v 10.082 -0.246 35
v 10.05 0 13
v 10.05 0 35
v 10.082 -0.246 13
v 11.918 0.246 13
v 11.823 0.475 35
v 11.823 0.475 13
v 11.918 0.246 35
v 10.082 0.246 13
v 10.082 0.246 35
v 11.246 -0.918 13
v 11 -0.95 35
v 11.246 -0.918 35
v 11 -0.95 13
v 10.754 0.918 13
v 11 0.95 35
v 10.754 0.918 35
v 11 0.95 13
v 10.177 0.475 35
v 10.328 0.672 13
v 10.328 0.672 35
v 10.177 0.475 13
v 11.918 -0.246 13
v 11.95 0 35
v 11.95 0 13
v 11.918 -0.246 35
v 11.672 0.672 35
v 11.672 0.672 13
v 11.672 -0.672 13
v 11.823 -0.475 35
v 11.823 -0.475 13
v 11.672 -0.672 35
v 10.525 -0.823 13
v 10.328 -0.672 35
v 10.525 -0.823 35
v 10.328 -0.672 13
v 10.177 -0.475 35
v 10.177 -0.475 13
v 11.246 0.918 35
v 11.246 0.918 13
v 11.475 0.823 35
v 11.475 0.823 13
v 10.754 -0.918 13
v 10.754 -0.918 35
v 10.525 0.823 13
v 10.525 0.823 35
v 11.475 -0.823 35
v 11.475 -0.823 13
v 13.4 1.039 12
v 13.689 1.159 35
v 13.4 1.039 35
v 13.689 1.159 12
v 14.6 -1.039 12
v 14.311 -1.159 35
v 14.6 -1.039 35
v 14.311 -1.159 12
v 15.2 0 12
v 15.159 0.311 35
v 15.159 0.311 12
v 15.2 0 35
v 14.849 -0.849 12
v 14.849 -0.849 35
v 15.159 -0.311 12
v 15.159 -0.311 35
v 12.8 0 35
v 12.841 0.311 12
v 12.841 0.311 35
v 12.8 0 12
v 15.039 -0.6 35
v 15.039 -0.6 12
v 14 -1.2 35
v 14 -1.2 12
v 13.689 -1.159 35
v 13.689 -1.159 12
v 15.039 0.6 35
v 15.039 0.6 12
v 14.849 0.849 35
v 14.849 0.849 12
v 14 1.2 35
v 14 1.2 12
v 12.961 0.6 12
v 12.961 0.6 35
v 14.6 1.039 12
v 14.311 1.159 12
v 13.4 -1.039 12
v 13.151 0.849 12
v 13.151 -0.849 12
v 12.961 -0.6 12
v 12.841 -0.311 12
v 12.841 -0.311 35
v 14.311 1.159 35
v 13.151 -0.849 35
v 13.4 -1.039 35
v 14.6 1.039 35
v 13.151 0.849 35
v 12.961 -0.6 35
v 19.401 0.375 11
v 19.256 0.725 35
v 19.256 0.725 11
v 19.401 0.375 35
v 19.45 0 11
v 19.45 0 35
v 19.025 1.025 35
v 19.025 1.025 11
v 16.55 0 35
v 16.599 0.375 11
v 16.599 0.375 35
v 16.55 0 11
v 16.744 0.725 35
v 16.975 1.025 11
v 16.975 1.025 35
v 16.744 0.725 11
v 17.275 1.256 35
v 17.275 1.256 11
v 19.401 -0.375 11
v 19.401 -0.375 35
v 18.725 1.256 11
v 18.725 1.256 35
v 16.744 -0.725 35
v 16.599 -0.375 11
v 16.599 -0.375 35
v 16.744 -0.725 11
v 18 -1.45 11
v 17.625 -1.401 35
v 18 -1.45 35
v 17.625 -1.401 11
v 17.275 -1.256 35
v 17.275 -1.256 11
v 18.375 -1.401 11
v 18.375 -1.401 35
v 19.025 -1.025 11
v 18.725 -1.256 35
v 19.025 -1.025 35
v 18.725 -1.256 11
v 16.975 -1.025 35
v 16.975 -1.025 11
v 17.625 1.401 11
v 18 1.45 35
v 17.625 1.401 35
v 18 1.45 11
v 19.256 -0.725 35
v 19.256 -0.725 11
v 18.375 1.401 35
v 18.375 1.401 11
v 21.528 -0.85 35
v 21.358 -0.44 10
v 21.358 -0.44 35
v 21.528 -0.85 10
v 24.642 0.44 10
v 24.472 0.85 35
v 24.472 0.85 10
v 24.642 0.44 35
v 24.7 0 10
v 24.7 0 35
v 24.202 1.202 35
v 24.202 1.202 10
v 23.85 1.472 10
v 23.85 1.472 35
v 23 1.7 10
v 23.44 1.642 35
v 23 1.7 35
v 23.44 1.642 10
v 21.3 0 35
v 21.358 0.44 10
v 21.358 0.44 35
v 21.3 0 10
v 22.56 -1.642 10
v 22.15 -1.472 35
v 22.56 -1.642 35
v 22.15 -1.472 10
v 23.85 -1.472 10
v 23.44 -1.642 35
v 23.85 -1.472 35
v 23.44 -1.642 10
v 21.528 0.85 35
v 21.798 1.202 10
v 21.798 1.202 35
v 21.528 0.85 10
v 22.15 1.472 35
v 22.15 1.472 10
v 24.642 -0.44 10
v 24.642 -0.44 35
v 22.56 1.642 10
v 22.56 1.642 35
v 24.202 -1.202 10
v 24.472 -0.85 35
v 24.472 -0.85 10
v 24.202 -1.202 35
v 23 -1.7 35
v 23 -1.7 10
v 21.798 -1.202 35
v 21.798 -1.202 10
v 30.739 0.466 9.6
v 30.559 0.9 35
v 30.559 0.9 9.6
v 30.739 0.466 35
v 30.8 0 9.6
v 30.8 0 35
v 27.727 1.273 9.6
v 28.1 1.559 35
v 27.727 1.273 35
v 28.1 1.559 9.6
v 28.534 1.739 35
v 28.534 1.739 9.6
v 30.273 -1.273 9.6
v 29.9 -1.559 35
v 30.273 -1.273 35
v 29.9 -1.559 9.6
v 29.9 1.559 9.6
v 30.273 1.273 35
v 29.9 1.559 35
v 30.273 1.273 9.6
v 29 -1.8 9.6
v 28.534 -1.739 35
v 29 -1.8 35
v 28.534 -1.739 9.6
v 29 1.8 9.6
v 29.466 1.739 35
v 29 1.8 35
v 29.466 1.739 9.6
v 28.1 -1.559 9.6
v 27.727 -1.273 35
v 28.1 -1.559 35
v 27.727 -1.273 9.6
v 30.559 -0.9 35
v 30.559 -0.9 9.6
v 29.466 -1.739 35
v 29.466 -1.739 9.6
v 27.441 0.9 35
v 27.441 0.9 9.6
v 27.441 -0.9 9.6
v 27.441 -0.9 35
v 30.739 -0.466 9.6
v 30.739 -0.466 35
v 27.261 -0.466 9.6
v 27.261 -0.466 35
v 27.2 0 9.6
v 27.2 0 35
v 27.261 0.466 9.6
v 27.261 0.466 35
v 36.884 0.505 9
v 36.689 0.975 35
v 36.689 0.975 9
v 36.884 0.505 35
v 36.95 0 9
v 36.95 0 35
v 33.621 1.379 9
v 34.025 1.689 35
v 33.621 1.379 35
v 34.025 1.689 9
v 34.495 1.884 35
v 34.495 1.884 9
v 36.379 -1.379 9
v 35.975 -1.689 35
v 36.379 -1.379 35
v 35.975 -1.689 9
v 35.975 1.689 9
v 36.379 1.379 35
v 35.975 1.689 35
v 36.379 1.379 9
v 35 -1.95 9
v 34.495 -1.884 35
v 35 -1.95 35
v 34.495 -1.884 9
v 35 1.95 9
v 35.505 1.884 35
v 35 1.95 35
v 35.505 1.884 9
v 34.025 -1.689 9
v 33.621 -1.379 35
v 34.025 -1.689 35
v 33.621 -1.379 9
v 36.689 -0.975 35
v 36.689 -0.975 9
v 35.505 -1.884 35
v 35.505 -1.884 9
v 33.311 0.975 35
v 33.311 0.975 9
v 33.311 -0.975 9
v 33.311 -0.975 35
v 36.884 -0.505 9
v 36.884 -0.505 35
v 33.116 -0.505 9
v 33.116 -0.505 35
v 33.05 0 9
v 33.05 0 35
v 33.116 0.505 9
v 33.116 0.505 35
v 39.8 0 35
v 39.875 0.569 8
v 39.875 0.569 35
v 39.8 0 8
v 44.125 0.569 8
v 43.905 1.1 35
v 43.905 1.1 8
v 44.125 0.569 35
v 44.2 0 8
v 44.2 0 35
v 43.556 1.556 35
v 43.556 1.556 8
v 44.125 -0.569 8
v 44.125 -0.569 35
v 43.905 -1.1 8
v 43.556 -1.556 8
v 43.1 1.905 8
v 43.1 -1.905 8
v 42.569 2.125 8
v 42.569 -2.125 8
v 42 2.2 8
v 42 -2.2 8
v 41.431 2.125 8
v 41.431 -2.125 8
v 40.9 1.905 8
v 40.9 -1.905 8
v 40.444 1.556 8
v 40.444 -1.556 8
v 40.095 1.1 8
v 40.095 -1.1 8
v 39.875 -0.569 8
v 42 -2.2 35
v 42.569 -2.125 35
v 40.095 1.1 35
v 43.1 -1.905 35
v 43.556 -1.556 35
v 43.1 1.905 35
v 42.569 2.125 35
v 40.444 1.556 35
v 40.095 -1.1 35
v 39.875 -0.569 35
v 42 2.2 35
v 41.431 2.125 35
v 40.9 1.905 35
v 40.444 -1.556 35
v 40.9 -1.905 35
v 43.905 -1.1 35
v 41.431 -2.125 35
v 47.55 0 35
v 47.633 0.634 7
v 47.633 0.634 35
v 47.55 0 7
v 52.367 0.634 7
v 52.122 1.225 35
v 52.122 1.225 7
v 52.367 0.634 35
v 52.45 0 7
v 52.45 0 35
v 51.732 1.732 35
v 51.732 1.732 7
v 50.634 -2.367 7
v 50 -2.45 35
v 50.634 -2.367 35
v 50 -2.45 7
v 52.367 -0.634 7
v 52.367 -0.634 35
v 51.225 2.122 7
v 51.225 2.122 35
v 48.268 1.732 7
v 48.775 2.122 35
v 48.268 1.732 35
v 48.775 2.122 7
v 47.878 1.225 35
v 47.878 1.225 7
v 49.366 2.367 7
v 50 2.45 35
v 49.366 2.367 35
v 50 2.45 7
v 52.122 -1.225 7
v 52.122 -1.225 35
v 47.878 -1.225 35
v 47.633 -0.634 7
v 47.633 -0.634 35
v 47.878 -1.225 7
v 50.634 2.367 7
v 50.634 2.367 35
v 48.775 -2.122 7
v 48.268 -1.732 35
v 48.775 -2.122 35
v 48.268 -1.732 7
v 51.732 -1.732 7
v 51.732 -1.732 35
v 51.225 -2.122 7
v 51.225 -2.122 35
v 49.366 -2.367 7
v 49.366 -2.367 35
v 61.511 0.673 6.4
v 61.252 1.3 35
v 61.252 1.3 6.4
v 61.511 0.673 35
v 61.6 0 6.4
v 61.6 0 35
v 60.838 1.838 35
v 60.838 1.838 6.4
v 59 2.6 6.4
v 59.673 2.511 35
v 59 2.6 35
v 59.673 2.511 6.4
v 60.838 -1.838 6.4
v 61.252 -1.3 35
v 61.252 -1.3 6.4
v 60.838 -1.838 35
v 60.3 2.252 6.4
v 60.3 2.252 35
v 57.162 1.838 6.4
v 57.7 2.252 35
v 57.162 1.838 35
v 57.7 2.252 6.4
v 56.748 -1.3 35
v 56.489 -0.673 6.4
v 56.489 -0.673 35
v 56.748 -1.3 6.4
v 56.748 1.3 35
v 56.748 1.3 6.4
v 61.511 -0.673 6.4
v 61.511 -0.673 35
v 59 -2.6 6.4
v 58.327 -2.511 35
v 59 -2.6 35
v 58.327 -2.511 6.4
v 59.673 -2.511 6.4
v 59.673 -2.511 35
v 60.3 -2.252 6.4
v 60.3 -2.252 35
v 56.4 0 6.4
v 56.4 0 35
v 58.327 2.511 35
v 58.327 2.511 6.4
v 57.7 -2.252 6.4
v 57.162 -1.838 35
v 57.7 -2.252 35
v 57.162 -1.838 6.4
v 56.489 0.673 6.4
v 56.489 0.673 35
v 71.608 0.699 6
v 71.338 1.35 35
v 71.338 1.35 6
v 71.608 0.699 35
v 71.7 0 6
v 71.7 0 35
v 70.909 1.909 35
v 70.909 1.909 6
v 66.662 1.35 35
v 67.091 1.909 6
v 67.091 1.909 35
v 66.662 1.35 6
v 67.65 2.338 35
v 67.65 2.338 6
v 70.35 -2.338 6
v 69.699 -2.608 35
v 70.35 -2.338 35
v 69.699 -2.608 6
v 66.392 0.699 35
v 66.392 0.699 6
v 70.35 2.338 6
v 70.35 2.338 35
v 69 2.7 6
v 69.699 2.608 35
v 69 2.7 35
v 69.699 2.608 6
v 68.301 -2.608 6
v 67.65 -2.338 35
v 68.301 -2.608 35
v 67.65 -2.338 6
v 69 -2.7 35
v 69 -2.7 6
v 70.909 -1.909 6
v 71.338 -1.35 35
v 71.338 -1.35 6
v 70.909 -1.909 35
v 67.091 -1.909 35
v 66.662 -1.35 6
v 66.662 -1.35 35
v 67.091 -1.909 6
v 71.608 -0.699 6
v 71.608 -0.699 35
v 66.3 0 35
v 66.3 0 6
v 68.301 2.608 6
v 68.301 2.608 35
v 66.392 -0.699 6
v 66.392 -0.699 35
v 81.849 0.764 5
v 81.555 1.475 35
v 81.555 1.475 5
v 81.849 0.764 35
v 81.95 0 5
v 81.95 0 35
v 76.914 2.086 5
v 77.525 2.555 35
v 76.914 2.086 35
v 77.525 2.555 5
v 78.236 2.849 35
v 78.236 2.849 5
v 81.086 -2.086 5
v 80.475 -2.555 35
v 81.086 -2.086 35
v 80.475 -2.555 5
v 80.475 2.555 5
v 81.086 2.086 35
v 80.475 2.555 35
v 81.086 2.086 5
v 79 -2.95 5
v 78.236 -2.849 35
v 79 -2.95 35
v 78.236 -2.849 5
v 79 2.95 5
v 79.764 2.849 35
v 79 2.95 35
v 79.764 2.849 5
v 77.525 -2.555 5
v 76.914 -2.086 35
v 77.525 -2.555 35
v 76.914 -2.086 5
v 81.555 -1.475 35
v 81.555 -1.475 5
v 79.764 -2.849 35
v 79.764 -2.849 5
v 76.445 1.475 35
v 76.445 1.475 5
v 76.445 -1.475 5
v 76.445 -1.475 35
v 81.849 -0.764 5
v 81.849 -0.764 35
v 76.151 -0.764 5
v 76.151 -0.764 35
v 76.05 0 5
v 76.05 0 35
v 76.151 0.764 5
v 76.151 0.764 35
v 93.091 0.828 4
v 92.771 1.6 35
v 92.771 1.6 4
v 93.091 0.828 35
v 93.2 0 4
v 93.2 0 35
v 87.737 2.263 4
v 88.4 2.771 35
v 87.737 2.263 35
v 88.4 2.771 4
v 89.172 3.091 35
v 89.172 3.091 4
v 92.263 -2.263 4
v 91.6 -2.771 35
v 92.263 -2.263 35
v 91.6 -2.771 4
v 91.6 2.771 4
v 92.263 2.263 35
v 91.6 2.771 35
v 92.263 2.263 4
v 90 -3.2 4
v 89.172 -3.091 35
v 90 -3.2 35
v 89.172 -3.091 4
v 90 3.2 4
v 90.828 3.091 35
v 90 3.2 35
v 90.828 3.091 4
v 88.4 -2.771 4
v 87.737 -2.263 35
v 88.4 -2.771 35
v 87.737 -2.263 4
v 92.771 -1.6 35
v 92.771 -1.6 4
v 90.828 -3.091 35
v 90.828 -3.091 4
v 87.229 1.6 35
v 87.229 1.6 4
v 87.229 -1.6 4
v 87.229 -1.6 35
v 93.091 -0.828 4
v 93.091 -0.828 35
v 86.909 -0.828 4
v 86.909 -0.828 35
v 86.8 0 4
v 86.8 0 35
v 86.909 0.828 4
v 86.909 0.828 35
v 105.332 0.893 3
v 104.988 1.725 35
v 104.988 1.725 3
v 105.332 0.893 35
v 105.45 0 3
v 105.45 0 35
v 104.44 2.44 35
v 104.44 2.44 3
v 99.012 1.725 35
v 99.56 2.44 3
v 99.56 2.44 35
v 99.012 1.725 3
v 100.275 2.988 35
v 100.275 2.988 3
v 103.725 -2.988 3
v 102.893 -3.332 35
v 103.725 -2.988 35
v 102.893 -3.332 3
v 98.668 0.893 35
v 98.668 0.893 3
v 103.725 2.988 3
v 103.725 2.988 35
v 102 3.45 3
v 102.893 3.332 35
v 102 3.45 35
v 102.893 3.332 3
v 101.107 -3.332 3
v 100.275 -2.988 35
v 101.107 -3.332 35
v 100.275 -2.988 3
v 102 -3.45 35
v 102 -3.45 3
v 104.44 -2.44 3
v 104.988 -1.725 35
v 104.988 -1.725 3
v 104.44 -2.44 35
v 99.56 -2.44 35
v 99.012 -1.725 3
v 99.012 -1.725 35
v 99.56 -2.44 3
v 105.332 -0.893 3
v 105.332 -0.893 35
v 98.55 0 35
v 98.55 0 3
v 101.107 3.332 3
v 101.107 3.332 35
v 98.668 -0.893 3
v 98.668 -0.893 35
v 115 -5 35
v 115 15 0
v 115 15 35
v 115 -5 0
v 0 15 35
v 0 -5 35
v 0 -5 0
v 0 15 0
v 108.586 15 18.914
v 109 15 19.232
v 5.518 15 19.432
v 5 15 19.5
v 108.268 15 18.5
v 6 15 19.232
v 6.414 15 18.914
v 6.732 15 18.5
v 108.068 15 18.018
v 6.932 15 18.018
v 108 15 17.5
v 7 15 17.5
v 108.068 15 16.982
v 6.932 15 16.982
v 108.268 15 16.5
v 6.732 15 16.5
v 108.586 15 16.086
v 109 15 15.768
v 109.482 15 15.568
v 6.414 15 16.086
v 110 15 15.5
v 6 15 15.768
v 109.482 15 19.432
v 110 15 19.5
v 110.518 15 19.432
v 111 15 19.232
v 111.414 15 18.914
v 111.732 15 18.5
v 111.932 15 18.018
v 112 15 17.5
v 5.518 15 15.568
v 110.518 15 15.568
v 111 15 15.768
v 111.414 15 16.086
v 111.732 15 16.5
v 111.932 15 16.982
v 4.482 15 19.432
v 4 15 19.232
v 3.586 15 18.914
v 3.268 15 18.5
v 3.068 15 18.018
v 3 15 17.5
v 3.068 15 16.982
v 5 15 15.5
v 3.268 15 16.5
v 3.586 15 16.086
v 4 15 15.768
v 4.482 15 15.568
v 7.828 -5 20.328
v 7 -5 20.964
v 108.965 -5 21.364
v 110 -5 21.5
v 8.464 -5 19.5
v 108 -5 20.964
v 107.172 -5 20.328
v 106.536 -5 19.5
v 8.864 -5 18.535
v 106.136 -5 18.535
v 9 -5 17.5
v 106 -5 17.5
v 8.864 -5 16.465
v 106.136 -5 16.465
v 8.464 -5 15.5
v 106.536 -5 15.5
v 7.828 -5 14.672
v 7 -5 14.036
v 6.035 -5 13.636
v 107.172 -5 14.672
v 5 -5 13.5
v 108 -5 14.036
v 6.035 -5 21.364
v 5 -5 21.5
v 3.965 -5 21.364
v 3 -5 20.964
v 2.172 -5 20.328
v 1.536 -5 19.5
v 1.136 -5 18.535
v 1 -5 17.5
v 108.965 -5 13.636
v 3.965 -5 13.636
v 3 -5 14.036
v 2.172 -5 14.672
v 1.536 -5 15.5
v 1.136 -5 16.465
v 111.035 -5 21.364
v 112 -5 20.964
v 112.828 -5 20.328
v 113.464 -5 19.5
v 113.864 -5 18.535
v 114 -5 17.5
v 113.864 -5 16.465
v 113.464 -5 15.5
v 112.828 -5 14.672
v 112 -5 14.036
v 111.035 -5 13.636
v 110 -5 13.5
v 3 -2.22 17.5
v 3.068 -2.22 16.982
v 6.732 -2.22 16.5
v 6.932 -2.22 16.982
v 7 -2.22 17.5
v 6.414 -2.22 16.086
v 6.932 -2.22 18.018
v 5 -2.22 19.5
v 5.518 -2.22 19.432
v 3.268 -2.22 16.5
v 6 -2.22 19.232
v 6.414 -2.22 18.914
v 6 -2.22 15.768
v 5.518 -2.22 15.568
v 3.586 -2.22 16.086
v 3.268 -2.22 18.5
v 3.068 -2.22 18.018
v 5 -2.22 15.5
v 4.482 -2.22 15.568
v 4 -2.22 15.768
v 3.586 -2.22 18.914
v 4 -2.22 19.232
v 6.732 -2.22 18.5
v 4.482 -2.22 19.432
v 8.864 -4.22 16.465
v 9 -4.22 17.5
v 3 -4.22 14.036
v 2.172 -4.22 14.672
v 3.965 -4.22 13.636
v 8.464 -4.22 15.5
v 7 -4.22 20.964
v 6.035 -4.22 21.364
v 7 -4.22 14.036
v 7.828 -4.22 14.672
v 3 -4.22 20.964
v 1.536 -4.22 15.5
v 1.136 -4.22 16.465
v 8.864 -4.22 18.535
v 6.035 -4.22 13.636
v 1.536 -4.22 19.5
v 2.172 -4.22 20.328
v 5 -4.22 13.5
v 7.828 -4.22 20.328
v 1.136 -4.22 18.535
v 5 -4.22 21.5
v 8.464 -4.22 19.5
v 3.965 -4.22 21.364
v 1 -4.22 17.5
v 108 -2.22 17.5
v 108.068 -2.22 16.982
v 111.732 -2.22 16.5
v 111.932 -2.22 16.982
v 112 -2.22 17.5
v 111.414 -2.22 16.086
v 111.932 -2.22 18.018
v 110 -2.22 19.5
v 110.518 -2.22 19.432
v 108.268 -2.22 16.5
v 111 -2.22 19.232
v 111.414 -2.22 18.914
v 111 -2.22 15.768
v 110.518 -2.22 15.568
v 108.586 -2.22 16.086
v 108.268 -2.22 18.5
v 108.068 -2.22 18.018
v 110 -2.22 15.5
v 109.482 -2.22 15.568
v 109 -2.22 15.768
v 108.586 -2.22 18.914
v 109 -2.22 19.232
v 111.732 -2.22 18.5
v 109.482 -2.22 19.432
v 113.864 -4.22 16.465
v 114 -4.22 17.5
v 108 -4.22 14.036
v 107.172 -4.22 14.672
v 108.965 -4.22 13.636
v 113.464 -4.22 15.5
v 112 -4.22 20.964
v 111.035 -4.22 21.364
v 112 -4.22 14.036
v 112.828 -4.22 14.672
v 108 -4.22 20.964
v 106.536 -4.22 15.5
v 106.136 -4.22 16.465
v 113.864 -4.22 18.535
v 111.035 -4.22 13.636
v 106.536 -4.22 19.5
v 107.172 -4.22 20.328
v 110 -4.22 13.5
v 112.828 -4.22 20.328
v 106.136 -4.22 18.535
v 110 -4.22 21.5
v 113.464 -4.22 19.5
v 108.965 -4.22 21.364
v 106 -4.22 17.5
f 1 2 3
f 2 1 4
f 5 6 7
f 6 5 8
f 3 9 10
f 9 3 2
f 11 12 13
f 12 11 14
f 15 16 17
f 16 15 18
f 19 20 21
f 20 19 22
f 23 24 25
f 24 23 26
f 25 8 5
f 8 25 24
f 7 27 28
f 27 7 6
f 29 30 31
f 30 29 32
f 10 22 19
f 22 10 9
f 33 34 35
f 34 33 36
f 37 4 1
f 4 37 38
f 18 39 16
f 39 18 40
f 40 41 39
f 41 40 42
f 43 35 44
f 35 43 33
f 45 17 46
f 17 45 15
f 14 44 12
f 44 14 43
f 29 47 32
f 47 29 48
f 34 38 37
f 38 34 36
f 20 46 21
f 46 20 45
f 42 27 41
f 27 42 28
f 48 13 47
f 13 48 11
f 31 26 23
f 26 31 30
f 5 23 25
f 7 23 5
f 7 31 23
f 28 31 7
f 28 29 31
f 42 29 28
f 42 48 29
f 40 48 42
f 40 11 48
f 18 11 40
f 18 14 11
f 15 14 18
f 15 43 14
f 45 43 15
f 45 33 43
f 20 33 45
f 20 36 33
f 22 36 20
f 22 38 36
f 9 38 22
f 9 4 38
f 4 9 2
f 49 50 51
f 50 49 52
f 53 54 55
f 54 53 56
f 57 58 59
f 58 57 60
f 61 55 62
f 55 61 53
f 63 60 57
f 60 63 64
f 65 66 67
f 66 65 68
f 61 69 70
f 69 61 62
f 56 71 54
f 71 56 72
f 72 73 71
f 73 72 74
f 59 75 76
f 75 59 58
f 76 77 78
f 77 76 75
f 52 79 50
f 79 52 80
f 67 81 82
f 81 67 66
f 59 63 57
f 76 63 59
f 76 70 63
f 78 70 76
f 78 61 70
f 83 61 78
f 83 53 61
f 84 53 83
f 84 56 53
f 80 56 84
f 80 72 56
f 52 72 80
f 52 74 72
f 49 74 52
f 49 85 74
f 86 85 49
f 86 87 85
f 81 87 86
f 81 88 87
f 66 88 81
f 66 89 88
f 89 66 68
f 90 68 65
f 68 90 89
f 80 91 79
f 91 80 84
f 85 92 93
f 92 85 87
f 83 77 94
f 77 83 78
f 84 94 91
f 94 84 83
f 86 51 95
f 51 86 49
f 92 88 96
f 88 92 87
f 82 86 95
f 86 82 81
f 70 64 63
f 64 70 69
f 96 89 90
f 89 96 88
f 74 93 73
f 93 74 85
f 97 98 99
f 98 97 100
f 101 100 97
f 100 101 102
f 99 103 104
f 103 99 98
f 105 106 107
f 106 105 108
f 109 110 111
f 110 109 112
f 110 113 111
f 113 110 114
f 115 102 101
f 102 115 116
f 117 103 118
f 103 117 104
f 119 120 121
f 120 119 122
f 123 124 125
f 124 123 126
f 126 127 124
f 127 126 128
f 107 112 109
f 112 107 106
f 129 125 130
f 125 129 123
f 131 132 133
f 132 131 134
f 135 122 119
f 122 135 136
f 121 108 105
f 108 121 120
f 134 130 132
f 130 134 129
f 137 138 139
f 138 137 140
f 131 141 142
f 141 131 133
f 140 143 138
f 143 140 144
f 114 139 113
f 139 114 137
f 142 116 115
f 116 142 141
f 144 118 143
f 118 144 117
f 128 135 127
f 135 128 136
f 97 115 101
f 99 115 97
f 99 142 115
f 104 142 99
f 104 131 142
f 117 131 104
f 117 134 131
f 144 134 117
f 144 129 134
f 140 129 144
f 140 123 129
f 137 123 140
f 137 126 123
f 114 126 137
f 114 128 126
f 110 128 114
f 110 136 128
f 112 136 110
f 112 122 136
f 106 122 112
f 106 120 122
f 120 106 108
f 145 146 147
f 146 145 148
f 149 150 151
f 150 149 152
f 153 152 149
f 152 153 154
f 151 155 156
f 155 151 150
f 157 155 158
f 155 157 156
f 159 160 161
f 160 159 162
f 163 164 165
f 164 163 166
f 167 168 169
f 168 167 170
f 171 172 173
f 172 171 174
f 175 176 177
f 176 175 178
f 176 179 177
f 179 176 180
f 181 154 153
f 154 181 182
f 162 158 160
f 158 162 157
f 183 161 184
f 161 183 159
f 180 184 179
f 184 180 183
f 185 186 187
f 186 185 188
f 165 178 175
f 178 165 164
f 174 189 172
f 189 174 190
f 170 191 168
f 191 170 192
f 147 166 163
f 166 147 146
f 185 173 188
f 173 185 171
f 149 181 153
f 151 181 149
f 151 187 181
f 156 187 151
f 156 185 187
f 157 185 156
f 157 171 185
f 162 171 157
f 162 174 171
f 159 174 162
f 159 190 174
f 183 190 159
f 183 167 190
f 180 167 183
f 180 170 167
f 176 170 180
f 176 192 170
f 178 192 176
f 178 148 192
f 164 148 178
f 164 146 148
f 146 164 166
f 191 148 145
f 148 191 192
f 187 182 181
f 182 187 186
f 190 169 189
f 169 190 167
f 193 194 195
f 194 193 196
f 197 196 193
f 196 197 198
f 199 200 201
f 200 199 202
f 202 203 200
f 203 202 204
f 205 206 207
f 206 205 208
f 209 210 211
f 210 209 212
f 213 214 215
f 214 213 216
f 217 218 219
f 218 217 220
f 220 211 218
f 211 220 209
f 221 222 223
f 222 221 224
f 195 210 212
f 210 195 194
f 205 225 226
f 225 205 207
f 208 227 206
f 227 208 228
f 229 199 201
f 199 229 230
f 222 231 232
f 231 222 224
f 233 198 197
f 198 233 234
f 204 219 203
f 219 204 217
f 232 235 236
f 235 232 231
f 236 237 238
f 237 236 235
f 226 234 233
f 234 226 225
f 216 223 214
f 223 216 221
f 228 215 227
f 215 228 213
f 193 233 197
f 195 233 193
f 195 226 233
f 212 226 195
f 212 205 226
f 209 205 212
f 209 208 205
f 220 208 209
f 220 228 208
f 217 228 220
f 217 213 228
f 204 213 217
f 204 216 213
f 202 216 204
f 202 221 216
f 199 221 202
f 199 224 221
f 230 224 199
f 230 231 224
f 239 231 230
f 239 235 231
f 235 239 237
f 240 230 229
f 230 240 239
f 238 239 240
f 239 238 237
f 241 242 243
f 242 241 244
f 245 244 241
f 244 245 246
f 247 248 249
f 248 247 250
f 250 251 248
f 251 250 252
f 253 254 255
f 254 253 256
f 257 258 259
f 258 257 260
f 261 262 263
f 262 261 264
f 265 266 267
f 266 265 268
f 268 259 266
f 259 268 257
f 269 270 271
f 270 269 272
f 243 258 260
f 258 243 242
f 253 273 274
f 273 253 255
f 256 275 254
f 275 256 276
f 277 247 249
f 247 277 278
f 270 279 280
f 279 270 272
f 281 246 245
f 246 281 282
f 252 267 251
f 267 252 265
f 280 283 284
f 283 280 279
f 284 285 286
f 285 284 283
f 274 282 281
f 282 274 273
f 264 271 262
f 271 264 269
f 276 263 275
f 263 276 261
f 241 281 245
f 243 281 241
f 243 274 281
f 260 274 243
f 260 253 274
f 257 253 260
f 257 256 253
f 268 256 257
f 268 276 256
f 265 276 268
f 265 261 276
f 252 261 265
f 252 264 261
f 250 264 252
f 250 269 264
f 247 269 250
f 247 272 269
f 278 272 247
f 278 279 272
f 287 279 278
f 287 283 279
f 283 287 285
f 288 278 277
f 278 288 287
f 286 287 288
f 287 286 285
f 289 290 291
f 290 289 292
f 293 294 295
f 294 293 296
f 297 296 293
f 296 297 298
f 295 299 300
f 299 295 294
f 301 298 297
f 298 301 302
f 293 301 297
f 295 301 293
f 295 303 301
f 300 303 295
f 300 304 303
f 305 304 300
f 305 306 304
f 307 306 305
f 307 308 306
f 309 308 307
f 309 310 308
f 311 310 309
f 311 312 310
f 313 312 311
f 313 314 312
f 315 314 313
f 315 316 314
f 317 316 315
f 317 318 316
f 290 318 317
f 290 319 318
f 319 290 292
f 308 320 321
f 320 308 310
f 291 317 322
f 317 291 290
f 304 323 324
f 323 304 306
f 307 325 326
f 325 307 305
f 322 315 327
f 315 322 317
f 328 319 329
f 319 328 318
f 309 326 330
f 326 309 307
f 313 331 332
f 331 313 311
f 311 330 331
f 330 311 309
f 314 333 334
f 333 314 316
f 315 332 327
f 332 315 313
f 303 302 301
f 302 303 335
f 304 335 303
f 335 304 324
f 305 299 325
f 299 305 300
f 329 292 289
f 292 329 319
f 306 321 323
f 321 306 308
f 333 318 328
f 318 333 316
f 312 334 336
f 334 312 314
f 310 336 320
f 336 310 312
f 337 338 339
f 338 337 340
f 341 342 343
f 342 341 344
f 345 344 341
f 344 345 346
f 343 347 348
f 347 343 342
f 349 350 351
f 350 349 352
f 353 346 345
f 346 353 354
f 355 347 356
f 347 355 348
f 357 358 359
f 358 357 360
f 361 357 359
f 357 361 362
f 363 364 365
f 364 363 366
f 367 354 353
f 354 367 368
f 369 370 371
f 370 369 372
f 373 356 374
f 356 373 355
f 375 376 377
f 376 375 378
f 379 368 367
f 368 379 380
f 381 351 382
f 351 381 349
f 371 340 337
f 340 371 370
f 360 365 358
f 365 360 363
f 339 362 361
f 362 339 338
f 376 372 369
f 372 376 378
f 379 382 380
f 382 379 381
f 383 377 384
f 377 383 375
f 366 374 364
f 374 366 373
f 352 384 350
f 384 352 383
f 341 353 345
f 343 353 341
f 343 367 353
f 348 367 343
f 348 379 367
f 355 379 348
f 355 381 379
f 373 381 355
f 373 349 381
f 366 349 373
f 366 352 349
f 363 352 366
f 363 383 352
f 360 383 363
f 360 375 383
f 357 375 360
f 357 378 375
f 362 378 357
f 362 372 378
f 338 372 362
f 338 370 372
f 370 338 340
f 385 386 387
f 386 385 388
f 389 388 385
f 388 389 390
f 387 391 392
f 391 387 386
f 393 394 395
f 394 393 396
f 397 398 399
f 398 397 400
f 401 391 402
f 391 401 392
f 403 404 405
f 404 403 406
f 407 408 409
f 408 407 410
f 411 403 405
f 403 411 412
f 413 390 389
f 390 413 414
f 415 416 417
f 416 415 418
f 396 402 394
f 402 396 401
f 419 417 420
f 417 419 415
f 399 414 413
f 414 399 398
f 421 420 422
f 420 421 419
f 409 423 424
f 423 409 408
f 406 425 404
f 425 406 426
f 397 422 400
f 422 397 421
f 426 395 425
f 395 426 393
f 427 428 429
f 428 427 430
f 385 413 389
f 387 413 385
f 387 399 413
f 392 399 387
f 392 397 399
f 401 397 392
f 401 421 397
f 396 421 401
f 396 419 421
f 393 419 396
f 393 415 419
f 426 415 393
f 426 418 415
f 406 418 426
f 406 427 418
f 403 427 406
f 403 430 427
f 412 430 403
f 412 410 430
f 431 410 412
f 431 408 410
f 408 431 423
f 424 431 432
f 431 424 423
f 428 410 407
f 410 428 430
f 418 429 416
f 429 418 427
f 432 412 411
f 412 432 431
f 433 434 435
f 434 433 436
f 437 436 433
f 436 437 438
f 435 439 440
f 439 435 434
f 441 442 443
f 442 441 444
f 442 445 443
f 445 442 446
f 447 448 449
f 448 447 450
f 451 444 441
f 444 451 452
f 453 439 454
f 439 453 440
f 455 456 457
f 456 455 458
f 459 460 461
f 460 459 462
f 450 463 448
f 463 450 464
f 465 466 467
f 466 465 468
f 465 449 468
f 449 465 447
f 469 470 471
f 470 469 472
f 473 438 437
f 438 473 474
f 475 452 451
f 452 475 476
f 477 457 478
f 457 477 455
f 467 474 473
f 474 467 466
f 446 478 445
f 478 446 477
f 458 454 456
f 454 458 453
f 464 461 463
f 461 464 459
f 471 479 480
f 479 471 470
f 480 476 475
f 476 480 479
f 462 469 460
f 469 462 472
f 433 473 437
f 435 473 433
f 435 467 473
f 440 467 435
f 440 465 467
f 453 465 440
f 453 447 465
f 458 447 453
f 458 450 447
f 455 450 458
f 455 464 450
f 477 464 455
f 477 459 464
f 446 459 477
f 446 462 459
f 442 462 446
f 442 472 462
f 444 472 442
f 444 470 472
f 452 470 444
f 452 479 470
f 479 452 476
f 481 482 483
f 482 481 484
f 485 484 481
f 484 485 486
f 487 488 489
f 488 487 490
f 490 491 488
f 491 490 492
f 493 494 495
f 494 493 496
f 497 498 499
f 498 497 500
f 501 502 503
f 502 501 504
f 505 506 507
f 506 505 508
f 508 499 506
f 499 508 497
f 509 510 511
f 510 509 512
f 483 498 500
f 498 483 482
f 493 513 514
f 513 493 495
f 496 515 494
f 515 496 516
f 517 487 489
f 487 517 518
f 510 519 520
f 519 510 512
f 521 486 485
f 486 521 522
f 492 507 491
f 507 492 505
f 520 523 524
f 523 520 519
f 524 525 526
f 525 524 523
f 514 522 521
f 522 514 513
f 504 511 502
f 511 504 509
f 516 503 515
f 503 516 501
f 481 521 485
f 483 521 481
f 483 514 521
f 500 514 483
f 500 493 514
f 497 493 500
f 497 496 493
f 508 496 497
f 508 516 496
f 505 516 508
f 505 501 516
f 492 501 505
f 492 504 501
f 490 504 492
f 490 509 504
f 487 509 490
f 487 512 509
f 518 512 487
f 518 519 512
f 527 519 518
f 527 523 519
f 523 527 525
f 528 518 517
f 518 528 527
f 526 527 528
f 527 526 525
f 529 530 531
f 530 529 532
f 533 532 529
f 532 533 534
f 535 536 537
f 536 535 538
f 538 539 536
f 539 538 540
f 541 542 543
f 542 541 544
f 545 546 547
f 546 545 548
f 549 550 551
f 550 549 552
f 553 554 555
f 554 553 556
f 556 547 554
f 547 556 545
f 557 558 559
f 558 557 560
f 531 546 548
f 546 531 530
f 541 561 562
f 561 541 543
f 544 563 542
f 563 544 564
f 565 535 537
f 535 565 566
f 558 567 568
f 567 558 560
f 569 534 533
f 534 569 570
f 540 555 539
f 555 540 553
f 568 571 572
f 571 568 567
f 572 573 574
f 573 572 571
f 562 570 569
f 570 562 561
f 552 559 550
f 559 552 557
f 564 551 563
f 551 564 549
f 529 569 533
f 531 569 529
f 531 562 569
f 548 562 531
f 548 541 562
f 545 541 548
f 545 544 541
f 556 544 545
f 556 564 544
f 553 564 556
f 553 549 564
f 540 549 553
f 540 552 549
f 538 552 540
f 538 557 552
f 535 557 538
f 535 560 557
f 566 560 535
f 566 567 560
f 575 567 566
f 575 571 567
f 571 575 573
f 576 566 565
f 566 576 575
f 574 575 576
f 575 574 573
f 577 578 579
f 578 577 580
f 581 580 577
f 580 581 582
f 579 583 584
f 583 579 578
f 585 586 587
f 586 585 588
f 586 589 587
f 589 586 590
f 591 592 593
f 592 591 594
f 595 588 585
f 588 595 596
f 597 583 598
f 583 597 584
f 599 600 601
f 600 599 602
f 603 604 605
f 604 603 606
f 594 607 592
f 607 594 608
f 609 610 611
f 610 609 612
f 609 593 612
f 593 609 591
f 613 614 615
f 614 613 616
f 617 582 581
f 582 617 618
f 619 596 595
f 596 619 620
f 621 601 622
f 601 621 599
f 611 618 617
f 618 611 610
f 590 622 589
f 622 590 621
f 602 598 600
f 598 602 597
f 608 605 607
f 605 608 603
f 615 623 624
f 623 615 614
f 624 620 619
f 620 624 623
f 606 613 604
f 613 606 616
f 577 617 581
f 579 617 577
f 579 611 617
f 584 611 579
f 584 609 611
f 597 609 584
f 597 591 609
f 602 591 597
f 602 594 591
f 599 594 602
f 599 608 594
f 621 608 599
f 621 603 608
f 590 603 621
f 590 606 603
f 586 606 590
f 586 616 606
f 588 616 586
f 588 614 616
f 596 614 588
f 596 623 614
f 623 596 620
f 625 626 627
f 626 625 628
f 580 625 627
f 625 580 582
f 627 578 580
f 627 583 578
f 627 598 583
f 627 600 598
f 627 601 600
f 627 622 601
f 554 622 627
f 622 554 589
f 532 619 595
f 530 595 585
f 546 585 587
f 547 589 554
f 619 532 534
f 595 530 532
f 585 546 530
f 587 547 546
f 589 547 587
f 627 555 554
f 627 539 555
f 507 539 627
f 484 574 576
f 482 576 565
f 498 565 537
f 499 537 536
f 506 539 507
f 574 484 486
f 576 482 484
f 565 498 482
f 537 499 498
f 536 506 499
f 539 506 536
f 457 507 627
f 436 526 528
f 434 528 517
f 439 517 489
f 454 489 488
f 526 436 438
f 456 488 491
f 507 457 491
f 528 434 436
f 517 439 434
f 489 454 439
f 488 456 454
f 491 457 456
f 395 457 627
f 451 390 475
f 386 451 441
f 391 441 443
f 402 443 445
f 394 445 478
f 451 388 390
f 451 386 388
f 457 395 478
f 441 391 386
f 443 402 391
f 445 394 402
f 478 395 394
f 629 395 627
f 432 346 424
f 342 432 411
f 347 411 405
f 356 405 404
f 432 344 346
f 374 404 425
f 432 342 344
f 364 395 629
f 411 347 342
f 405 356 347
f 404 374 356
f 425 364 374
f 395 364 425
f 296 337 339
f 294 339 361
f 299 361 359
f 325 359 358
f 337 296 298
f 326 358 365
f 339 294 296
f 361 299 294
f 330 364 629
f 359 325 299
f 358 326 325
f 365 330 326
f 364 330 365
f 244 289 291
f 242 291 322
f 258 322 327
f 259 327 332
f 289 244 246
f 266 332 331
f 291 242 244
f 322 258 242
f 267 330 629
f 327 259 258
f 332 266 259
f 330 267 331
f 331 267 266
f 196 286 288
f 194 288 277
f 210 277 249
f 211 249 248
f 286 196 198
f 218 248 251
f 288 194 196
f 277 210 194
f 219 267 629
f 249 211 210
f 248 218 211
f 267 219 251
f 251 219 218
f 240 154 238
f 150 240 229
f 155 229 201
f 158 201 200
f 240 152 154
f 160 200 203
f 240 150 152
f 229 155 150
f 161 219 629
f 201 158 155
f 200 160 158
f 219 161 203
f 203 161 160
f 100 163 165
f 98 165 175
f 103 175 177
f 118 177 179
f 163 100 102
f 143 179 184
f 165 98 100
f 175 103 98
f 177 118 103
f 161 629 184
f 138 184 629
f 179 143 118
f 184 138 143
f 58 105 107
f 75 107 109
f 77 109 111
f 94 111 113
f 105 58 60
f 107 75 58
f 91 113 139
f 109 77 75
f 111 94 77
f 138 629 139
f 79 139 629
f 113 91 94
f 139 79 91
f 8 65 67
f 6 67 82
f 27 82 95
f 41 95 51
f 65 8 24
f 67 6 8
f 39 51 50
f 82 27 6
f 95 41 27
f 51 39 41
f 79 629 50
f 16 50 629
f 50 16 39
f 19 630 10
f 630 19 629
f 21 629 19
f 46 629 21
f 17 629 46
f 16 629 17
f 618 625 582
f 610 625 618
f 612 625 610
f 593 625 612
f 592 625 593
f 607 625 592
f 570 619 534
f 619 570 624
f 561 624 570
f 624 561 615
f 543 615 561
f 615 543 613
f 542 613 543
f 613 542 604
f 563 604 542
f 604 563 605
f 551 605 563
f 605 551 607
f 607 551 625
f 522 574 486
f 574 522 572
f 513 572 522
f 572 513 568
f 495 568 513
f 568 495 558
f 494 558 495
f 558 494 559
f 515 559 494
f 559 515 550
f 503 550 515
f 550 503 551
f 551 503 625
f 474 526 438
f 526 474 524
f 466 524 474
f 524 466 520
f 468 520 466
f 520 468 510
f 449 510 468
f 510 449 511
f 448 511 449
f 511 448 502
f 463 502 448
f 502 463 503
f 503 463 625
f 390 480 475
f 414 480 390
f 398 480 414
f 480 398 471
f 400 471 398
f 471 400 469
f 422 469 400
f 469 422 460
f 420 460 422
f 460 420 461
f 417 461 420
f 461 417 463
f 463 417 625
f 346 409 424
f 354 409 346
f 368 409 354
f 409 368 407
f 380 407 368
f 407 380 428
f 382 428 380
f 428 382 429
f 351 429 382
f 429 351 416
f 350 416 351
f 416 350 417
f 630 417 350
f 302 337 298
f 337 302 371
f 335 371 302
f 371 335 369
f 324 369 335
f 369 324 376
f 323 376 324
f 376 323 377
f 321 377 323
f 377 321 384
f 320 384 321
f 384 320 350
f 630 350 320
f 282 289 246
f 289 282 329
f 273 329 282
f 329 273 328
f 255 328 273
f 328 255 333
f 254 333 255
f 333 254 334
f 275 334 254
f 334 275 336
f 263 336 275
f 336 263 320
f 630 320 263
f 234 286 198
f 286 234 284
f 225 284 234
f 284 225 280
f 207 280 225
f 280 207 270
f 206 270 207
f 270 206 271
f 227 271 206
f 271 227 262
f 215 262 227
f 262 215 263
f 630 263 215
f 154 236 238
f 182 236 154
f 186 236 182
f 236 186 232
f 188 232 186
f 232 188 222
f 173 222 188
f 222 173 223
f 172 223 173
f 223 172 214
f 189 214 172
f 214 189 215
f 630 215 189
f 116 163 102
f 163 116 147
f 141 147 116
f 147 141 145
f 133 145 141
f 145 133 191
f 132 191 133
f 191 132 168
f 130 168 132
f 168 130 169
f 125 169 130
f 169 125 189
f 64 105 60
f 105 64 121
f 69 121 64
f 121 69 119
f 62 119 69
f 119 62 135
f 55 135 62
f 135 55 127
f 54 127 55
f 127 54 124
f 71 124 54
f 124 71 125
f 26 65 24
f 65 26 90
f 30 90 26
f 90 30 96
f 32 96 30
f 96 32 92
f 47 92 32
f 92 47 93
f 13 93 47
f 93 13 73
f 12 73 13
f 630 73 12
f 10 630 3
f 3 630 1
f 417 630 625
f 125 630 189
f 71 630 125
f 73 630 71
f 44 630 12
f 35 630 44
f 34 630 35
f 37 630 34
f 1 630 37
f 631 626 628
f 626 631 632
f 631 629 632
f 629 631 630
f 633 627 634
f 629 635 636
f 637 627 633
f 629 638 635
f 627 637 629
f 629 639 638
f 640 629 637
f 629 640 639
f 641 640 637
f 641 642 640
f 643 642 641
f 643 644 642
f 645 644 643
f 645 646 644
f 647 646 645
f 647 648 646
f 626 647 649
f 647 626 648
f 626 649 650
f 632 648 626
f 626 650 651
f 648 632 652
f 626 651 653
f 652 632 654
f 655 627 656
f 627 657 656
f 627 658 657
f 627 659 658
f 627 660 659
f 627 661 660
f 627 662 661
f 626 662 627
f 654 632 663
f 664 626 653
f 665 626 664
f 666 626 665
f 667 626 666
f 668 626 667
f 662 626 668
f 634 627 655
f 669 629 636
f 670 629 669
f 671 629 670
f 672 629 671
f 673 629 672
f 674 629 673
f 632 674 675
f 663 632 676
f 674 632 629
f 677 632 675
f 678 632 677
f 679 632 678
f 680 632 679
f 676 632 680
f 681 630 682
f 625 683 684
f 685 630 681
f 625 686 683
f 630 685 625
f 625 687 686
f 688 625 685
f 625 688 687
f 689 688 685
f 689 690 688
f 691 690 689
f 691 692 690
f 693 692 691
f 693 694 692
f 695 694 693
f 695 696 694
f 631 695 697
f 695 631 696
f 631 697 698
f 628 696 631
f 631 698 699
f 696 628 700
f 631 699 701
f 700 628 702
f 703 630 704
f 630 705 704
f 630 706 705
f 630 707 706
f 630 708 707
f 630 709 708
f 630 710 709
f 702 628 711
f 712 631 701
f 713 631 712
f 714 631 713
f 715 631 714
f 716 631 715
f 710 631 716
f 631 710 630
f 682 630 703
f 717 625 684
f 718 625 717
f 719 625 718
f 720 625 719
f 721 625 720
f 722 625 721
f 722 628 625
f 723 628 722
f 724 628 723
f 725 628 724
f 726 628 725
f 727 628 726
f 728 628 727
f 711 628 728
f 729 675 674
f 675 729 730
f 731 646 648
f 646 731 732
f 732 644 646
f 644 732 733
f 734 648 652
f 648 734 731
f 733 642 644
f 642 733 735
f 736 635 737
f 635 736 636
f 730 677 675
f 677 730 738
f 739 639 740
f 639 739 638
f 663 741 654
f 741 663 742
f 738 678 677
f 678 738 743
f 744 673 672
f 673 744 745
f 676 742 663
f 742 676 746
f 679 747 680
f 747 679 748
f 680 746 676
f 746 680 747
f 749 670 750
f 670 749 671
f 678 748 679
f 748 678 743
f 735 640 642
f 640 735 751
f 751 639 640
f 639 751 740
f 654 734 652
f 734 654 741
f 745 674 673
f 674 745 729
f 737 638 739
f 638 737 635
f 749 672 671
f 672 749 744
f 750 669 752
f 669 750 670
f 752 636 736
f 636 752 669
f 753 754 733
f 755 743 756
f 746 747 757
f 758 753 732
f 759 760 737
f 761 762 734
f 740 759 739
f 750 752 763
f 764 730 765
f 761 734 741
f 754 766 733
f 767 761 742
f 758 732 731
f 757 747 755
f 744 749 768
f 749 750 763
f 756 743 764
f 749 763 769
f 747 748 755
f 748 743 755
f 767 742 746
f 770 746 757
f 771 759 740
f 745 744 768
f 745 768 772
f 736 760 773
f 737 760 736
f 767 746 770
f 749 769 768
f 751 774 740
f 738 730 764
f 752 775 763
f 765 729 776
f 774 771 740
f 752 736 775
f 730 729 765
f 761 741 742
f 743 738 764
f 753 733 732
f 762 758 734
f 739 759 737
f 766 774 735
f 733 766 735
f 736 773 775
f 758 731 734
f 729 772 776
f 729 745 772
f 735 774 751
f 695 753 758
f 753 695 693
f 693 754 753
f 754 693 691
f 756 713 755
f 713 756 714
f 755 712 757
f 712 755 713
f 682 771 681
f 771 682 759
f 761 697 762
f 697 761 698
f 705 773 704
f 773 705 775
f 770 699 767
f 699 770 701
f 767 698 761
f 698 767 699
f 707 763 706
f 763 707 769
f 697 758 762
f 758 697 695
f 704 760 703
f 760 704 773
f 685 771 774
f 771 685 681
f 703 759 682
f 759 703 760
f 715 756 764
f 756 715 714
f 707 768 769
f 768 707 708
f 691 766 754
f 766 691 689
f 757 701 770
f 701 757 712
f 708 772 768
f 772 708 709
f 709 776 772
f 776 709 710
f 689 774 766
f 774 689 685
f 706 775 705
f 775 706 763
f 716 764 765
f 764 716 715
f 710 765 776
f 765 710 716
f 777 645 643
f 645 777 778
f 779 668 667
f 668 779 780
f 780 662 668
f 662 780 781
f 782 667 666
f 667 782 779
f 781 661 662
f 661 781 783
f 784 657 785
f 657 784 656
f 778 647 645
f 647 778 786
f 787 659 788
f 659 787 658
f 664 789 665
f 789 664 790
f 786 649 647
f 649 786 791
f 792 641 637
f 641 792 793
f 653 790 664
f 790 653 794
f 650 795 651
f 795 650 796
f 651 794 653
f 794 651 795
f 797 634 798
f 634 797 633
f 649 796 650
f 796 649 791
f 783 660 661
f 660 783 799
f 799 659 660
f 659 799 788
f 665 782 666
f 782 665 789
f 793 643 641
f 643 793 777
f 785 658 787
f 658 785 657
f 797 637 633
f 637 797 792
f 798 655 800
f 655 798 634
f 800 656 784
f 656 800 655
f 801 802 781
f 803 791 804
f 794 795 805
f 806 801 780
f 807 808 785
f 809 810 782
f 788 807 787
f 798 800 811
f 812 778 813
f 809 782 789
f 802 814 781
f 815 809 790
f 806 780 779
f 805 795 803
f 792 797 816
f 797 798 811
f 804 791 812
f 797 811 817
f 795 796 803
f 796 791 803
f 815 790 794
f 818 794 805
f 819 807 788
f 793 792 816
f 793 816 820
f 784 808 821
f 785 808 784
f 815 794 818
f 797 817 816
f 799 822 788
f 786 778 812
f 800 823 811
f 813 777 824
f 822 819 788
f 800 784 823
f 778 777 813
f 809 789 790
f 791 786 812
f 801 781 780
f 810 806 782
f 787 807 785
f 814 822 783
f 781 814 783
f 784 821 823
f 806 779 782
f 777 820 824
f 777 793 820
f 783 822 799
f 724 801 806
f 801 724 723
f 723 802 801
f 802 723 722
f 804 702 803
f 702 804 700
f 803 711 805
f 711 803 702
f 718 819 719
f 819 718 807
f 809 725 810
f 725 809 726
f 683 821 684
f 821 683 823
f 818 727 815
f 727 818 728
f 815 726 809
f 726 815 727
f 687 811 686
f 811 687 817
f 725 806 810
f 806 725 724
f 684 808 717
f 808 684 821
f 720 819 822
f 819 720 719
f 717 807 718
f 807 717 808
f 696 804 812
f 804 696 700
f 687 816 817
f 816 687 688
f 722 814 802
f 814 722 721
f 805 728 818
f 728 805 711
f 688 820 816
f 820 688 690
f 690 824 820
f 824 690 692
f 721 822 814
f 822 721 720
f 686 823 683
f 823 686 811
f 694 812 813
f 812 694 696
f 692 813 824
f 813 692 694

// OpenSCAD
// Drill bits holder 3D Design

// Copyright (c) 2014 by Jeremy Bennett <jeremy.bennett@embecosm.com>

// Crimp holder 3D Design is licensed under a Creative Commons
// Attribution-ShareAlike 3.0 Unported License.

// You should have received a copy of the license along with this work.  If not,
// see <http://creativecommons.org/licenses/by-sa/3.0/>.

// -----------------------------------------------------------------------------


use <MCAD/regular_shapes.scad>


// A screw hole with a countersink
module screwhole (bore, length) {
	iota = length / 100;
	half_length = length / 2 + iota;
	full_length = half_length * 2;
	union () {
		cylinder (r = bore / 2, h = full_length, center = true, $fn = 24);
		translate (v = [0, 0, -half_length + bore / 4 + bore / 4])
			cylinder (r1 = bore, r2 = bore / 2, h = bore / 2, center = true, $fn = 24);
		translate (v = [0, 0, -half_length + bore / 8])
			cylinder (r = bore, h = bore / 4, center = true, $fn = 24);
	}
}


// A screw hole for a screw parallel with the Y axis
module screwhole_y (bore, length, x_off, y_off, z_off) {
	translate (v = [x_off, y_off, z_off])
		rotate (a = [-90, 0, 0])
			screwhole (bore = bore, length = length);
}


module drill_holes () {
	diams = [1.5, 2.0, 2.5, 3.0, 3.2, 3.5, 4.0, 4.5, 4.8, 5.0, 5.5, 6.0, 6.5];
	offs  = [11, 14, 18, 23, 29, 35, 42, 50, 59, 69, 79, 90, 102];
	for (i = [0 : 12]) {
		translate (v = [offs[i], 0, 16 - 2 * diams[i]])
			cylinder (r = diams[i] / 2 + 0.2, h = 40, $fn = 24, center = false);
	}
}

// Block to be a support. Needs to be far enough away that we can get our hands on the
// drill bits
module drill_block () {
	width = 115;
	difference () {
		translate (v = [width / 2, 5, 17.5])
			cube (size = [width, 20, 35], center = true);
		drill_holes ();
	}
}


// Support with screwholes
module drill_support () {
	difference () {
		drill_block ();
		// screw_holes
		screwhole_y (bore = 4, length = 22, x_off =   5, y_off = 6, z_off = 17.5);
		screwhole_y (bore = 4, length = 22, x_off = 110, y_off = 6, z_off = 17.5);
	}
}

drill_support ();
